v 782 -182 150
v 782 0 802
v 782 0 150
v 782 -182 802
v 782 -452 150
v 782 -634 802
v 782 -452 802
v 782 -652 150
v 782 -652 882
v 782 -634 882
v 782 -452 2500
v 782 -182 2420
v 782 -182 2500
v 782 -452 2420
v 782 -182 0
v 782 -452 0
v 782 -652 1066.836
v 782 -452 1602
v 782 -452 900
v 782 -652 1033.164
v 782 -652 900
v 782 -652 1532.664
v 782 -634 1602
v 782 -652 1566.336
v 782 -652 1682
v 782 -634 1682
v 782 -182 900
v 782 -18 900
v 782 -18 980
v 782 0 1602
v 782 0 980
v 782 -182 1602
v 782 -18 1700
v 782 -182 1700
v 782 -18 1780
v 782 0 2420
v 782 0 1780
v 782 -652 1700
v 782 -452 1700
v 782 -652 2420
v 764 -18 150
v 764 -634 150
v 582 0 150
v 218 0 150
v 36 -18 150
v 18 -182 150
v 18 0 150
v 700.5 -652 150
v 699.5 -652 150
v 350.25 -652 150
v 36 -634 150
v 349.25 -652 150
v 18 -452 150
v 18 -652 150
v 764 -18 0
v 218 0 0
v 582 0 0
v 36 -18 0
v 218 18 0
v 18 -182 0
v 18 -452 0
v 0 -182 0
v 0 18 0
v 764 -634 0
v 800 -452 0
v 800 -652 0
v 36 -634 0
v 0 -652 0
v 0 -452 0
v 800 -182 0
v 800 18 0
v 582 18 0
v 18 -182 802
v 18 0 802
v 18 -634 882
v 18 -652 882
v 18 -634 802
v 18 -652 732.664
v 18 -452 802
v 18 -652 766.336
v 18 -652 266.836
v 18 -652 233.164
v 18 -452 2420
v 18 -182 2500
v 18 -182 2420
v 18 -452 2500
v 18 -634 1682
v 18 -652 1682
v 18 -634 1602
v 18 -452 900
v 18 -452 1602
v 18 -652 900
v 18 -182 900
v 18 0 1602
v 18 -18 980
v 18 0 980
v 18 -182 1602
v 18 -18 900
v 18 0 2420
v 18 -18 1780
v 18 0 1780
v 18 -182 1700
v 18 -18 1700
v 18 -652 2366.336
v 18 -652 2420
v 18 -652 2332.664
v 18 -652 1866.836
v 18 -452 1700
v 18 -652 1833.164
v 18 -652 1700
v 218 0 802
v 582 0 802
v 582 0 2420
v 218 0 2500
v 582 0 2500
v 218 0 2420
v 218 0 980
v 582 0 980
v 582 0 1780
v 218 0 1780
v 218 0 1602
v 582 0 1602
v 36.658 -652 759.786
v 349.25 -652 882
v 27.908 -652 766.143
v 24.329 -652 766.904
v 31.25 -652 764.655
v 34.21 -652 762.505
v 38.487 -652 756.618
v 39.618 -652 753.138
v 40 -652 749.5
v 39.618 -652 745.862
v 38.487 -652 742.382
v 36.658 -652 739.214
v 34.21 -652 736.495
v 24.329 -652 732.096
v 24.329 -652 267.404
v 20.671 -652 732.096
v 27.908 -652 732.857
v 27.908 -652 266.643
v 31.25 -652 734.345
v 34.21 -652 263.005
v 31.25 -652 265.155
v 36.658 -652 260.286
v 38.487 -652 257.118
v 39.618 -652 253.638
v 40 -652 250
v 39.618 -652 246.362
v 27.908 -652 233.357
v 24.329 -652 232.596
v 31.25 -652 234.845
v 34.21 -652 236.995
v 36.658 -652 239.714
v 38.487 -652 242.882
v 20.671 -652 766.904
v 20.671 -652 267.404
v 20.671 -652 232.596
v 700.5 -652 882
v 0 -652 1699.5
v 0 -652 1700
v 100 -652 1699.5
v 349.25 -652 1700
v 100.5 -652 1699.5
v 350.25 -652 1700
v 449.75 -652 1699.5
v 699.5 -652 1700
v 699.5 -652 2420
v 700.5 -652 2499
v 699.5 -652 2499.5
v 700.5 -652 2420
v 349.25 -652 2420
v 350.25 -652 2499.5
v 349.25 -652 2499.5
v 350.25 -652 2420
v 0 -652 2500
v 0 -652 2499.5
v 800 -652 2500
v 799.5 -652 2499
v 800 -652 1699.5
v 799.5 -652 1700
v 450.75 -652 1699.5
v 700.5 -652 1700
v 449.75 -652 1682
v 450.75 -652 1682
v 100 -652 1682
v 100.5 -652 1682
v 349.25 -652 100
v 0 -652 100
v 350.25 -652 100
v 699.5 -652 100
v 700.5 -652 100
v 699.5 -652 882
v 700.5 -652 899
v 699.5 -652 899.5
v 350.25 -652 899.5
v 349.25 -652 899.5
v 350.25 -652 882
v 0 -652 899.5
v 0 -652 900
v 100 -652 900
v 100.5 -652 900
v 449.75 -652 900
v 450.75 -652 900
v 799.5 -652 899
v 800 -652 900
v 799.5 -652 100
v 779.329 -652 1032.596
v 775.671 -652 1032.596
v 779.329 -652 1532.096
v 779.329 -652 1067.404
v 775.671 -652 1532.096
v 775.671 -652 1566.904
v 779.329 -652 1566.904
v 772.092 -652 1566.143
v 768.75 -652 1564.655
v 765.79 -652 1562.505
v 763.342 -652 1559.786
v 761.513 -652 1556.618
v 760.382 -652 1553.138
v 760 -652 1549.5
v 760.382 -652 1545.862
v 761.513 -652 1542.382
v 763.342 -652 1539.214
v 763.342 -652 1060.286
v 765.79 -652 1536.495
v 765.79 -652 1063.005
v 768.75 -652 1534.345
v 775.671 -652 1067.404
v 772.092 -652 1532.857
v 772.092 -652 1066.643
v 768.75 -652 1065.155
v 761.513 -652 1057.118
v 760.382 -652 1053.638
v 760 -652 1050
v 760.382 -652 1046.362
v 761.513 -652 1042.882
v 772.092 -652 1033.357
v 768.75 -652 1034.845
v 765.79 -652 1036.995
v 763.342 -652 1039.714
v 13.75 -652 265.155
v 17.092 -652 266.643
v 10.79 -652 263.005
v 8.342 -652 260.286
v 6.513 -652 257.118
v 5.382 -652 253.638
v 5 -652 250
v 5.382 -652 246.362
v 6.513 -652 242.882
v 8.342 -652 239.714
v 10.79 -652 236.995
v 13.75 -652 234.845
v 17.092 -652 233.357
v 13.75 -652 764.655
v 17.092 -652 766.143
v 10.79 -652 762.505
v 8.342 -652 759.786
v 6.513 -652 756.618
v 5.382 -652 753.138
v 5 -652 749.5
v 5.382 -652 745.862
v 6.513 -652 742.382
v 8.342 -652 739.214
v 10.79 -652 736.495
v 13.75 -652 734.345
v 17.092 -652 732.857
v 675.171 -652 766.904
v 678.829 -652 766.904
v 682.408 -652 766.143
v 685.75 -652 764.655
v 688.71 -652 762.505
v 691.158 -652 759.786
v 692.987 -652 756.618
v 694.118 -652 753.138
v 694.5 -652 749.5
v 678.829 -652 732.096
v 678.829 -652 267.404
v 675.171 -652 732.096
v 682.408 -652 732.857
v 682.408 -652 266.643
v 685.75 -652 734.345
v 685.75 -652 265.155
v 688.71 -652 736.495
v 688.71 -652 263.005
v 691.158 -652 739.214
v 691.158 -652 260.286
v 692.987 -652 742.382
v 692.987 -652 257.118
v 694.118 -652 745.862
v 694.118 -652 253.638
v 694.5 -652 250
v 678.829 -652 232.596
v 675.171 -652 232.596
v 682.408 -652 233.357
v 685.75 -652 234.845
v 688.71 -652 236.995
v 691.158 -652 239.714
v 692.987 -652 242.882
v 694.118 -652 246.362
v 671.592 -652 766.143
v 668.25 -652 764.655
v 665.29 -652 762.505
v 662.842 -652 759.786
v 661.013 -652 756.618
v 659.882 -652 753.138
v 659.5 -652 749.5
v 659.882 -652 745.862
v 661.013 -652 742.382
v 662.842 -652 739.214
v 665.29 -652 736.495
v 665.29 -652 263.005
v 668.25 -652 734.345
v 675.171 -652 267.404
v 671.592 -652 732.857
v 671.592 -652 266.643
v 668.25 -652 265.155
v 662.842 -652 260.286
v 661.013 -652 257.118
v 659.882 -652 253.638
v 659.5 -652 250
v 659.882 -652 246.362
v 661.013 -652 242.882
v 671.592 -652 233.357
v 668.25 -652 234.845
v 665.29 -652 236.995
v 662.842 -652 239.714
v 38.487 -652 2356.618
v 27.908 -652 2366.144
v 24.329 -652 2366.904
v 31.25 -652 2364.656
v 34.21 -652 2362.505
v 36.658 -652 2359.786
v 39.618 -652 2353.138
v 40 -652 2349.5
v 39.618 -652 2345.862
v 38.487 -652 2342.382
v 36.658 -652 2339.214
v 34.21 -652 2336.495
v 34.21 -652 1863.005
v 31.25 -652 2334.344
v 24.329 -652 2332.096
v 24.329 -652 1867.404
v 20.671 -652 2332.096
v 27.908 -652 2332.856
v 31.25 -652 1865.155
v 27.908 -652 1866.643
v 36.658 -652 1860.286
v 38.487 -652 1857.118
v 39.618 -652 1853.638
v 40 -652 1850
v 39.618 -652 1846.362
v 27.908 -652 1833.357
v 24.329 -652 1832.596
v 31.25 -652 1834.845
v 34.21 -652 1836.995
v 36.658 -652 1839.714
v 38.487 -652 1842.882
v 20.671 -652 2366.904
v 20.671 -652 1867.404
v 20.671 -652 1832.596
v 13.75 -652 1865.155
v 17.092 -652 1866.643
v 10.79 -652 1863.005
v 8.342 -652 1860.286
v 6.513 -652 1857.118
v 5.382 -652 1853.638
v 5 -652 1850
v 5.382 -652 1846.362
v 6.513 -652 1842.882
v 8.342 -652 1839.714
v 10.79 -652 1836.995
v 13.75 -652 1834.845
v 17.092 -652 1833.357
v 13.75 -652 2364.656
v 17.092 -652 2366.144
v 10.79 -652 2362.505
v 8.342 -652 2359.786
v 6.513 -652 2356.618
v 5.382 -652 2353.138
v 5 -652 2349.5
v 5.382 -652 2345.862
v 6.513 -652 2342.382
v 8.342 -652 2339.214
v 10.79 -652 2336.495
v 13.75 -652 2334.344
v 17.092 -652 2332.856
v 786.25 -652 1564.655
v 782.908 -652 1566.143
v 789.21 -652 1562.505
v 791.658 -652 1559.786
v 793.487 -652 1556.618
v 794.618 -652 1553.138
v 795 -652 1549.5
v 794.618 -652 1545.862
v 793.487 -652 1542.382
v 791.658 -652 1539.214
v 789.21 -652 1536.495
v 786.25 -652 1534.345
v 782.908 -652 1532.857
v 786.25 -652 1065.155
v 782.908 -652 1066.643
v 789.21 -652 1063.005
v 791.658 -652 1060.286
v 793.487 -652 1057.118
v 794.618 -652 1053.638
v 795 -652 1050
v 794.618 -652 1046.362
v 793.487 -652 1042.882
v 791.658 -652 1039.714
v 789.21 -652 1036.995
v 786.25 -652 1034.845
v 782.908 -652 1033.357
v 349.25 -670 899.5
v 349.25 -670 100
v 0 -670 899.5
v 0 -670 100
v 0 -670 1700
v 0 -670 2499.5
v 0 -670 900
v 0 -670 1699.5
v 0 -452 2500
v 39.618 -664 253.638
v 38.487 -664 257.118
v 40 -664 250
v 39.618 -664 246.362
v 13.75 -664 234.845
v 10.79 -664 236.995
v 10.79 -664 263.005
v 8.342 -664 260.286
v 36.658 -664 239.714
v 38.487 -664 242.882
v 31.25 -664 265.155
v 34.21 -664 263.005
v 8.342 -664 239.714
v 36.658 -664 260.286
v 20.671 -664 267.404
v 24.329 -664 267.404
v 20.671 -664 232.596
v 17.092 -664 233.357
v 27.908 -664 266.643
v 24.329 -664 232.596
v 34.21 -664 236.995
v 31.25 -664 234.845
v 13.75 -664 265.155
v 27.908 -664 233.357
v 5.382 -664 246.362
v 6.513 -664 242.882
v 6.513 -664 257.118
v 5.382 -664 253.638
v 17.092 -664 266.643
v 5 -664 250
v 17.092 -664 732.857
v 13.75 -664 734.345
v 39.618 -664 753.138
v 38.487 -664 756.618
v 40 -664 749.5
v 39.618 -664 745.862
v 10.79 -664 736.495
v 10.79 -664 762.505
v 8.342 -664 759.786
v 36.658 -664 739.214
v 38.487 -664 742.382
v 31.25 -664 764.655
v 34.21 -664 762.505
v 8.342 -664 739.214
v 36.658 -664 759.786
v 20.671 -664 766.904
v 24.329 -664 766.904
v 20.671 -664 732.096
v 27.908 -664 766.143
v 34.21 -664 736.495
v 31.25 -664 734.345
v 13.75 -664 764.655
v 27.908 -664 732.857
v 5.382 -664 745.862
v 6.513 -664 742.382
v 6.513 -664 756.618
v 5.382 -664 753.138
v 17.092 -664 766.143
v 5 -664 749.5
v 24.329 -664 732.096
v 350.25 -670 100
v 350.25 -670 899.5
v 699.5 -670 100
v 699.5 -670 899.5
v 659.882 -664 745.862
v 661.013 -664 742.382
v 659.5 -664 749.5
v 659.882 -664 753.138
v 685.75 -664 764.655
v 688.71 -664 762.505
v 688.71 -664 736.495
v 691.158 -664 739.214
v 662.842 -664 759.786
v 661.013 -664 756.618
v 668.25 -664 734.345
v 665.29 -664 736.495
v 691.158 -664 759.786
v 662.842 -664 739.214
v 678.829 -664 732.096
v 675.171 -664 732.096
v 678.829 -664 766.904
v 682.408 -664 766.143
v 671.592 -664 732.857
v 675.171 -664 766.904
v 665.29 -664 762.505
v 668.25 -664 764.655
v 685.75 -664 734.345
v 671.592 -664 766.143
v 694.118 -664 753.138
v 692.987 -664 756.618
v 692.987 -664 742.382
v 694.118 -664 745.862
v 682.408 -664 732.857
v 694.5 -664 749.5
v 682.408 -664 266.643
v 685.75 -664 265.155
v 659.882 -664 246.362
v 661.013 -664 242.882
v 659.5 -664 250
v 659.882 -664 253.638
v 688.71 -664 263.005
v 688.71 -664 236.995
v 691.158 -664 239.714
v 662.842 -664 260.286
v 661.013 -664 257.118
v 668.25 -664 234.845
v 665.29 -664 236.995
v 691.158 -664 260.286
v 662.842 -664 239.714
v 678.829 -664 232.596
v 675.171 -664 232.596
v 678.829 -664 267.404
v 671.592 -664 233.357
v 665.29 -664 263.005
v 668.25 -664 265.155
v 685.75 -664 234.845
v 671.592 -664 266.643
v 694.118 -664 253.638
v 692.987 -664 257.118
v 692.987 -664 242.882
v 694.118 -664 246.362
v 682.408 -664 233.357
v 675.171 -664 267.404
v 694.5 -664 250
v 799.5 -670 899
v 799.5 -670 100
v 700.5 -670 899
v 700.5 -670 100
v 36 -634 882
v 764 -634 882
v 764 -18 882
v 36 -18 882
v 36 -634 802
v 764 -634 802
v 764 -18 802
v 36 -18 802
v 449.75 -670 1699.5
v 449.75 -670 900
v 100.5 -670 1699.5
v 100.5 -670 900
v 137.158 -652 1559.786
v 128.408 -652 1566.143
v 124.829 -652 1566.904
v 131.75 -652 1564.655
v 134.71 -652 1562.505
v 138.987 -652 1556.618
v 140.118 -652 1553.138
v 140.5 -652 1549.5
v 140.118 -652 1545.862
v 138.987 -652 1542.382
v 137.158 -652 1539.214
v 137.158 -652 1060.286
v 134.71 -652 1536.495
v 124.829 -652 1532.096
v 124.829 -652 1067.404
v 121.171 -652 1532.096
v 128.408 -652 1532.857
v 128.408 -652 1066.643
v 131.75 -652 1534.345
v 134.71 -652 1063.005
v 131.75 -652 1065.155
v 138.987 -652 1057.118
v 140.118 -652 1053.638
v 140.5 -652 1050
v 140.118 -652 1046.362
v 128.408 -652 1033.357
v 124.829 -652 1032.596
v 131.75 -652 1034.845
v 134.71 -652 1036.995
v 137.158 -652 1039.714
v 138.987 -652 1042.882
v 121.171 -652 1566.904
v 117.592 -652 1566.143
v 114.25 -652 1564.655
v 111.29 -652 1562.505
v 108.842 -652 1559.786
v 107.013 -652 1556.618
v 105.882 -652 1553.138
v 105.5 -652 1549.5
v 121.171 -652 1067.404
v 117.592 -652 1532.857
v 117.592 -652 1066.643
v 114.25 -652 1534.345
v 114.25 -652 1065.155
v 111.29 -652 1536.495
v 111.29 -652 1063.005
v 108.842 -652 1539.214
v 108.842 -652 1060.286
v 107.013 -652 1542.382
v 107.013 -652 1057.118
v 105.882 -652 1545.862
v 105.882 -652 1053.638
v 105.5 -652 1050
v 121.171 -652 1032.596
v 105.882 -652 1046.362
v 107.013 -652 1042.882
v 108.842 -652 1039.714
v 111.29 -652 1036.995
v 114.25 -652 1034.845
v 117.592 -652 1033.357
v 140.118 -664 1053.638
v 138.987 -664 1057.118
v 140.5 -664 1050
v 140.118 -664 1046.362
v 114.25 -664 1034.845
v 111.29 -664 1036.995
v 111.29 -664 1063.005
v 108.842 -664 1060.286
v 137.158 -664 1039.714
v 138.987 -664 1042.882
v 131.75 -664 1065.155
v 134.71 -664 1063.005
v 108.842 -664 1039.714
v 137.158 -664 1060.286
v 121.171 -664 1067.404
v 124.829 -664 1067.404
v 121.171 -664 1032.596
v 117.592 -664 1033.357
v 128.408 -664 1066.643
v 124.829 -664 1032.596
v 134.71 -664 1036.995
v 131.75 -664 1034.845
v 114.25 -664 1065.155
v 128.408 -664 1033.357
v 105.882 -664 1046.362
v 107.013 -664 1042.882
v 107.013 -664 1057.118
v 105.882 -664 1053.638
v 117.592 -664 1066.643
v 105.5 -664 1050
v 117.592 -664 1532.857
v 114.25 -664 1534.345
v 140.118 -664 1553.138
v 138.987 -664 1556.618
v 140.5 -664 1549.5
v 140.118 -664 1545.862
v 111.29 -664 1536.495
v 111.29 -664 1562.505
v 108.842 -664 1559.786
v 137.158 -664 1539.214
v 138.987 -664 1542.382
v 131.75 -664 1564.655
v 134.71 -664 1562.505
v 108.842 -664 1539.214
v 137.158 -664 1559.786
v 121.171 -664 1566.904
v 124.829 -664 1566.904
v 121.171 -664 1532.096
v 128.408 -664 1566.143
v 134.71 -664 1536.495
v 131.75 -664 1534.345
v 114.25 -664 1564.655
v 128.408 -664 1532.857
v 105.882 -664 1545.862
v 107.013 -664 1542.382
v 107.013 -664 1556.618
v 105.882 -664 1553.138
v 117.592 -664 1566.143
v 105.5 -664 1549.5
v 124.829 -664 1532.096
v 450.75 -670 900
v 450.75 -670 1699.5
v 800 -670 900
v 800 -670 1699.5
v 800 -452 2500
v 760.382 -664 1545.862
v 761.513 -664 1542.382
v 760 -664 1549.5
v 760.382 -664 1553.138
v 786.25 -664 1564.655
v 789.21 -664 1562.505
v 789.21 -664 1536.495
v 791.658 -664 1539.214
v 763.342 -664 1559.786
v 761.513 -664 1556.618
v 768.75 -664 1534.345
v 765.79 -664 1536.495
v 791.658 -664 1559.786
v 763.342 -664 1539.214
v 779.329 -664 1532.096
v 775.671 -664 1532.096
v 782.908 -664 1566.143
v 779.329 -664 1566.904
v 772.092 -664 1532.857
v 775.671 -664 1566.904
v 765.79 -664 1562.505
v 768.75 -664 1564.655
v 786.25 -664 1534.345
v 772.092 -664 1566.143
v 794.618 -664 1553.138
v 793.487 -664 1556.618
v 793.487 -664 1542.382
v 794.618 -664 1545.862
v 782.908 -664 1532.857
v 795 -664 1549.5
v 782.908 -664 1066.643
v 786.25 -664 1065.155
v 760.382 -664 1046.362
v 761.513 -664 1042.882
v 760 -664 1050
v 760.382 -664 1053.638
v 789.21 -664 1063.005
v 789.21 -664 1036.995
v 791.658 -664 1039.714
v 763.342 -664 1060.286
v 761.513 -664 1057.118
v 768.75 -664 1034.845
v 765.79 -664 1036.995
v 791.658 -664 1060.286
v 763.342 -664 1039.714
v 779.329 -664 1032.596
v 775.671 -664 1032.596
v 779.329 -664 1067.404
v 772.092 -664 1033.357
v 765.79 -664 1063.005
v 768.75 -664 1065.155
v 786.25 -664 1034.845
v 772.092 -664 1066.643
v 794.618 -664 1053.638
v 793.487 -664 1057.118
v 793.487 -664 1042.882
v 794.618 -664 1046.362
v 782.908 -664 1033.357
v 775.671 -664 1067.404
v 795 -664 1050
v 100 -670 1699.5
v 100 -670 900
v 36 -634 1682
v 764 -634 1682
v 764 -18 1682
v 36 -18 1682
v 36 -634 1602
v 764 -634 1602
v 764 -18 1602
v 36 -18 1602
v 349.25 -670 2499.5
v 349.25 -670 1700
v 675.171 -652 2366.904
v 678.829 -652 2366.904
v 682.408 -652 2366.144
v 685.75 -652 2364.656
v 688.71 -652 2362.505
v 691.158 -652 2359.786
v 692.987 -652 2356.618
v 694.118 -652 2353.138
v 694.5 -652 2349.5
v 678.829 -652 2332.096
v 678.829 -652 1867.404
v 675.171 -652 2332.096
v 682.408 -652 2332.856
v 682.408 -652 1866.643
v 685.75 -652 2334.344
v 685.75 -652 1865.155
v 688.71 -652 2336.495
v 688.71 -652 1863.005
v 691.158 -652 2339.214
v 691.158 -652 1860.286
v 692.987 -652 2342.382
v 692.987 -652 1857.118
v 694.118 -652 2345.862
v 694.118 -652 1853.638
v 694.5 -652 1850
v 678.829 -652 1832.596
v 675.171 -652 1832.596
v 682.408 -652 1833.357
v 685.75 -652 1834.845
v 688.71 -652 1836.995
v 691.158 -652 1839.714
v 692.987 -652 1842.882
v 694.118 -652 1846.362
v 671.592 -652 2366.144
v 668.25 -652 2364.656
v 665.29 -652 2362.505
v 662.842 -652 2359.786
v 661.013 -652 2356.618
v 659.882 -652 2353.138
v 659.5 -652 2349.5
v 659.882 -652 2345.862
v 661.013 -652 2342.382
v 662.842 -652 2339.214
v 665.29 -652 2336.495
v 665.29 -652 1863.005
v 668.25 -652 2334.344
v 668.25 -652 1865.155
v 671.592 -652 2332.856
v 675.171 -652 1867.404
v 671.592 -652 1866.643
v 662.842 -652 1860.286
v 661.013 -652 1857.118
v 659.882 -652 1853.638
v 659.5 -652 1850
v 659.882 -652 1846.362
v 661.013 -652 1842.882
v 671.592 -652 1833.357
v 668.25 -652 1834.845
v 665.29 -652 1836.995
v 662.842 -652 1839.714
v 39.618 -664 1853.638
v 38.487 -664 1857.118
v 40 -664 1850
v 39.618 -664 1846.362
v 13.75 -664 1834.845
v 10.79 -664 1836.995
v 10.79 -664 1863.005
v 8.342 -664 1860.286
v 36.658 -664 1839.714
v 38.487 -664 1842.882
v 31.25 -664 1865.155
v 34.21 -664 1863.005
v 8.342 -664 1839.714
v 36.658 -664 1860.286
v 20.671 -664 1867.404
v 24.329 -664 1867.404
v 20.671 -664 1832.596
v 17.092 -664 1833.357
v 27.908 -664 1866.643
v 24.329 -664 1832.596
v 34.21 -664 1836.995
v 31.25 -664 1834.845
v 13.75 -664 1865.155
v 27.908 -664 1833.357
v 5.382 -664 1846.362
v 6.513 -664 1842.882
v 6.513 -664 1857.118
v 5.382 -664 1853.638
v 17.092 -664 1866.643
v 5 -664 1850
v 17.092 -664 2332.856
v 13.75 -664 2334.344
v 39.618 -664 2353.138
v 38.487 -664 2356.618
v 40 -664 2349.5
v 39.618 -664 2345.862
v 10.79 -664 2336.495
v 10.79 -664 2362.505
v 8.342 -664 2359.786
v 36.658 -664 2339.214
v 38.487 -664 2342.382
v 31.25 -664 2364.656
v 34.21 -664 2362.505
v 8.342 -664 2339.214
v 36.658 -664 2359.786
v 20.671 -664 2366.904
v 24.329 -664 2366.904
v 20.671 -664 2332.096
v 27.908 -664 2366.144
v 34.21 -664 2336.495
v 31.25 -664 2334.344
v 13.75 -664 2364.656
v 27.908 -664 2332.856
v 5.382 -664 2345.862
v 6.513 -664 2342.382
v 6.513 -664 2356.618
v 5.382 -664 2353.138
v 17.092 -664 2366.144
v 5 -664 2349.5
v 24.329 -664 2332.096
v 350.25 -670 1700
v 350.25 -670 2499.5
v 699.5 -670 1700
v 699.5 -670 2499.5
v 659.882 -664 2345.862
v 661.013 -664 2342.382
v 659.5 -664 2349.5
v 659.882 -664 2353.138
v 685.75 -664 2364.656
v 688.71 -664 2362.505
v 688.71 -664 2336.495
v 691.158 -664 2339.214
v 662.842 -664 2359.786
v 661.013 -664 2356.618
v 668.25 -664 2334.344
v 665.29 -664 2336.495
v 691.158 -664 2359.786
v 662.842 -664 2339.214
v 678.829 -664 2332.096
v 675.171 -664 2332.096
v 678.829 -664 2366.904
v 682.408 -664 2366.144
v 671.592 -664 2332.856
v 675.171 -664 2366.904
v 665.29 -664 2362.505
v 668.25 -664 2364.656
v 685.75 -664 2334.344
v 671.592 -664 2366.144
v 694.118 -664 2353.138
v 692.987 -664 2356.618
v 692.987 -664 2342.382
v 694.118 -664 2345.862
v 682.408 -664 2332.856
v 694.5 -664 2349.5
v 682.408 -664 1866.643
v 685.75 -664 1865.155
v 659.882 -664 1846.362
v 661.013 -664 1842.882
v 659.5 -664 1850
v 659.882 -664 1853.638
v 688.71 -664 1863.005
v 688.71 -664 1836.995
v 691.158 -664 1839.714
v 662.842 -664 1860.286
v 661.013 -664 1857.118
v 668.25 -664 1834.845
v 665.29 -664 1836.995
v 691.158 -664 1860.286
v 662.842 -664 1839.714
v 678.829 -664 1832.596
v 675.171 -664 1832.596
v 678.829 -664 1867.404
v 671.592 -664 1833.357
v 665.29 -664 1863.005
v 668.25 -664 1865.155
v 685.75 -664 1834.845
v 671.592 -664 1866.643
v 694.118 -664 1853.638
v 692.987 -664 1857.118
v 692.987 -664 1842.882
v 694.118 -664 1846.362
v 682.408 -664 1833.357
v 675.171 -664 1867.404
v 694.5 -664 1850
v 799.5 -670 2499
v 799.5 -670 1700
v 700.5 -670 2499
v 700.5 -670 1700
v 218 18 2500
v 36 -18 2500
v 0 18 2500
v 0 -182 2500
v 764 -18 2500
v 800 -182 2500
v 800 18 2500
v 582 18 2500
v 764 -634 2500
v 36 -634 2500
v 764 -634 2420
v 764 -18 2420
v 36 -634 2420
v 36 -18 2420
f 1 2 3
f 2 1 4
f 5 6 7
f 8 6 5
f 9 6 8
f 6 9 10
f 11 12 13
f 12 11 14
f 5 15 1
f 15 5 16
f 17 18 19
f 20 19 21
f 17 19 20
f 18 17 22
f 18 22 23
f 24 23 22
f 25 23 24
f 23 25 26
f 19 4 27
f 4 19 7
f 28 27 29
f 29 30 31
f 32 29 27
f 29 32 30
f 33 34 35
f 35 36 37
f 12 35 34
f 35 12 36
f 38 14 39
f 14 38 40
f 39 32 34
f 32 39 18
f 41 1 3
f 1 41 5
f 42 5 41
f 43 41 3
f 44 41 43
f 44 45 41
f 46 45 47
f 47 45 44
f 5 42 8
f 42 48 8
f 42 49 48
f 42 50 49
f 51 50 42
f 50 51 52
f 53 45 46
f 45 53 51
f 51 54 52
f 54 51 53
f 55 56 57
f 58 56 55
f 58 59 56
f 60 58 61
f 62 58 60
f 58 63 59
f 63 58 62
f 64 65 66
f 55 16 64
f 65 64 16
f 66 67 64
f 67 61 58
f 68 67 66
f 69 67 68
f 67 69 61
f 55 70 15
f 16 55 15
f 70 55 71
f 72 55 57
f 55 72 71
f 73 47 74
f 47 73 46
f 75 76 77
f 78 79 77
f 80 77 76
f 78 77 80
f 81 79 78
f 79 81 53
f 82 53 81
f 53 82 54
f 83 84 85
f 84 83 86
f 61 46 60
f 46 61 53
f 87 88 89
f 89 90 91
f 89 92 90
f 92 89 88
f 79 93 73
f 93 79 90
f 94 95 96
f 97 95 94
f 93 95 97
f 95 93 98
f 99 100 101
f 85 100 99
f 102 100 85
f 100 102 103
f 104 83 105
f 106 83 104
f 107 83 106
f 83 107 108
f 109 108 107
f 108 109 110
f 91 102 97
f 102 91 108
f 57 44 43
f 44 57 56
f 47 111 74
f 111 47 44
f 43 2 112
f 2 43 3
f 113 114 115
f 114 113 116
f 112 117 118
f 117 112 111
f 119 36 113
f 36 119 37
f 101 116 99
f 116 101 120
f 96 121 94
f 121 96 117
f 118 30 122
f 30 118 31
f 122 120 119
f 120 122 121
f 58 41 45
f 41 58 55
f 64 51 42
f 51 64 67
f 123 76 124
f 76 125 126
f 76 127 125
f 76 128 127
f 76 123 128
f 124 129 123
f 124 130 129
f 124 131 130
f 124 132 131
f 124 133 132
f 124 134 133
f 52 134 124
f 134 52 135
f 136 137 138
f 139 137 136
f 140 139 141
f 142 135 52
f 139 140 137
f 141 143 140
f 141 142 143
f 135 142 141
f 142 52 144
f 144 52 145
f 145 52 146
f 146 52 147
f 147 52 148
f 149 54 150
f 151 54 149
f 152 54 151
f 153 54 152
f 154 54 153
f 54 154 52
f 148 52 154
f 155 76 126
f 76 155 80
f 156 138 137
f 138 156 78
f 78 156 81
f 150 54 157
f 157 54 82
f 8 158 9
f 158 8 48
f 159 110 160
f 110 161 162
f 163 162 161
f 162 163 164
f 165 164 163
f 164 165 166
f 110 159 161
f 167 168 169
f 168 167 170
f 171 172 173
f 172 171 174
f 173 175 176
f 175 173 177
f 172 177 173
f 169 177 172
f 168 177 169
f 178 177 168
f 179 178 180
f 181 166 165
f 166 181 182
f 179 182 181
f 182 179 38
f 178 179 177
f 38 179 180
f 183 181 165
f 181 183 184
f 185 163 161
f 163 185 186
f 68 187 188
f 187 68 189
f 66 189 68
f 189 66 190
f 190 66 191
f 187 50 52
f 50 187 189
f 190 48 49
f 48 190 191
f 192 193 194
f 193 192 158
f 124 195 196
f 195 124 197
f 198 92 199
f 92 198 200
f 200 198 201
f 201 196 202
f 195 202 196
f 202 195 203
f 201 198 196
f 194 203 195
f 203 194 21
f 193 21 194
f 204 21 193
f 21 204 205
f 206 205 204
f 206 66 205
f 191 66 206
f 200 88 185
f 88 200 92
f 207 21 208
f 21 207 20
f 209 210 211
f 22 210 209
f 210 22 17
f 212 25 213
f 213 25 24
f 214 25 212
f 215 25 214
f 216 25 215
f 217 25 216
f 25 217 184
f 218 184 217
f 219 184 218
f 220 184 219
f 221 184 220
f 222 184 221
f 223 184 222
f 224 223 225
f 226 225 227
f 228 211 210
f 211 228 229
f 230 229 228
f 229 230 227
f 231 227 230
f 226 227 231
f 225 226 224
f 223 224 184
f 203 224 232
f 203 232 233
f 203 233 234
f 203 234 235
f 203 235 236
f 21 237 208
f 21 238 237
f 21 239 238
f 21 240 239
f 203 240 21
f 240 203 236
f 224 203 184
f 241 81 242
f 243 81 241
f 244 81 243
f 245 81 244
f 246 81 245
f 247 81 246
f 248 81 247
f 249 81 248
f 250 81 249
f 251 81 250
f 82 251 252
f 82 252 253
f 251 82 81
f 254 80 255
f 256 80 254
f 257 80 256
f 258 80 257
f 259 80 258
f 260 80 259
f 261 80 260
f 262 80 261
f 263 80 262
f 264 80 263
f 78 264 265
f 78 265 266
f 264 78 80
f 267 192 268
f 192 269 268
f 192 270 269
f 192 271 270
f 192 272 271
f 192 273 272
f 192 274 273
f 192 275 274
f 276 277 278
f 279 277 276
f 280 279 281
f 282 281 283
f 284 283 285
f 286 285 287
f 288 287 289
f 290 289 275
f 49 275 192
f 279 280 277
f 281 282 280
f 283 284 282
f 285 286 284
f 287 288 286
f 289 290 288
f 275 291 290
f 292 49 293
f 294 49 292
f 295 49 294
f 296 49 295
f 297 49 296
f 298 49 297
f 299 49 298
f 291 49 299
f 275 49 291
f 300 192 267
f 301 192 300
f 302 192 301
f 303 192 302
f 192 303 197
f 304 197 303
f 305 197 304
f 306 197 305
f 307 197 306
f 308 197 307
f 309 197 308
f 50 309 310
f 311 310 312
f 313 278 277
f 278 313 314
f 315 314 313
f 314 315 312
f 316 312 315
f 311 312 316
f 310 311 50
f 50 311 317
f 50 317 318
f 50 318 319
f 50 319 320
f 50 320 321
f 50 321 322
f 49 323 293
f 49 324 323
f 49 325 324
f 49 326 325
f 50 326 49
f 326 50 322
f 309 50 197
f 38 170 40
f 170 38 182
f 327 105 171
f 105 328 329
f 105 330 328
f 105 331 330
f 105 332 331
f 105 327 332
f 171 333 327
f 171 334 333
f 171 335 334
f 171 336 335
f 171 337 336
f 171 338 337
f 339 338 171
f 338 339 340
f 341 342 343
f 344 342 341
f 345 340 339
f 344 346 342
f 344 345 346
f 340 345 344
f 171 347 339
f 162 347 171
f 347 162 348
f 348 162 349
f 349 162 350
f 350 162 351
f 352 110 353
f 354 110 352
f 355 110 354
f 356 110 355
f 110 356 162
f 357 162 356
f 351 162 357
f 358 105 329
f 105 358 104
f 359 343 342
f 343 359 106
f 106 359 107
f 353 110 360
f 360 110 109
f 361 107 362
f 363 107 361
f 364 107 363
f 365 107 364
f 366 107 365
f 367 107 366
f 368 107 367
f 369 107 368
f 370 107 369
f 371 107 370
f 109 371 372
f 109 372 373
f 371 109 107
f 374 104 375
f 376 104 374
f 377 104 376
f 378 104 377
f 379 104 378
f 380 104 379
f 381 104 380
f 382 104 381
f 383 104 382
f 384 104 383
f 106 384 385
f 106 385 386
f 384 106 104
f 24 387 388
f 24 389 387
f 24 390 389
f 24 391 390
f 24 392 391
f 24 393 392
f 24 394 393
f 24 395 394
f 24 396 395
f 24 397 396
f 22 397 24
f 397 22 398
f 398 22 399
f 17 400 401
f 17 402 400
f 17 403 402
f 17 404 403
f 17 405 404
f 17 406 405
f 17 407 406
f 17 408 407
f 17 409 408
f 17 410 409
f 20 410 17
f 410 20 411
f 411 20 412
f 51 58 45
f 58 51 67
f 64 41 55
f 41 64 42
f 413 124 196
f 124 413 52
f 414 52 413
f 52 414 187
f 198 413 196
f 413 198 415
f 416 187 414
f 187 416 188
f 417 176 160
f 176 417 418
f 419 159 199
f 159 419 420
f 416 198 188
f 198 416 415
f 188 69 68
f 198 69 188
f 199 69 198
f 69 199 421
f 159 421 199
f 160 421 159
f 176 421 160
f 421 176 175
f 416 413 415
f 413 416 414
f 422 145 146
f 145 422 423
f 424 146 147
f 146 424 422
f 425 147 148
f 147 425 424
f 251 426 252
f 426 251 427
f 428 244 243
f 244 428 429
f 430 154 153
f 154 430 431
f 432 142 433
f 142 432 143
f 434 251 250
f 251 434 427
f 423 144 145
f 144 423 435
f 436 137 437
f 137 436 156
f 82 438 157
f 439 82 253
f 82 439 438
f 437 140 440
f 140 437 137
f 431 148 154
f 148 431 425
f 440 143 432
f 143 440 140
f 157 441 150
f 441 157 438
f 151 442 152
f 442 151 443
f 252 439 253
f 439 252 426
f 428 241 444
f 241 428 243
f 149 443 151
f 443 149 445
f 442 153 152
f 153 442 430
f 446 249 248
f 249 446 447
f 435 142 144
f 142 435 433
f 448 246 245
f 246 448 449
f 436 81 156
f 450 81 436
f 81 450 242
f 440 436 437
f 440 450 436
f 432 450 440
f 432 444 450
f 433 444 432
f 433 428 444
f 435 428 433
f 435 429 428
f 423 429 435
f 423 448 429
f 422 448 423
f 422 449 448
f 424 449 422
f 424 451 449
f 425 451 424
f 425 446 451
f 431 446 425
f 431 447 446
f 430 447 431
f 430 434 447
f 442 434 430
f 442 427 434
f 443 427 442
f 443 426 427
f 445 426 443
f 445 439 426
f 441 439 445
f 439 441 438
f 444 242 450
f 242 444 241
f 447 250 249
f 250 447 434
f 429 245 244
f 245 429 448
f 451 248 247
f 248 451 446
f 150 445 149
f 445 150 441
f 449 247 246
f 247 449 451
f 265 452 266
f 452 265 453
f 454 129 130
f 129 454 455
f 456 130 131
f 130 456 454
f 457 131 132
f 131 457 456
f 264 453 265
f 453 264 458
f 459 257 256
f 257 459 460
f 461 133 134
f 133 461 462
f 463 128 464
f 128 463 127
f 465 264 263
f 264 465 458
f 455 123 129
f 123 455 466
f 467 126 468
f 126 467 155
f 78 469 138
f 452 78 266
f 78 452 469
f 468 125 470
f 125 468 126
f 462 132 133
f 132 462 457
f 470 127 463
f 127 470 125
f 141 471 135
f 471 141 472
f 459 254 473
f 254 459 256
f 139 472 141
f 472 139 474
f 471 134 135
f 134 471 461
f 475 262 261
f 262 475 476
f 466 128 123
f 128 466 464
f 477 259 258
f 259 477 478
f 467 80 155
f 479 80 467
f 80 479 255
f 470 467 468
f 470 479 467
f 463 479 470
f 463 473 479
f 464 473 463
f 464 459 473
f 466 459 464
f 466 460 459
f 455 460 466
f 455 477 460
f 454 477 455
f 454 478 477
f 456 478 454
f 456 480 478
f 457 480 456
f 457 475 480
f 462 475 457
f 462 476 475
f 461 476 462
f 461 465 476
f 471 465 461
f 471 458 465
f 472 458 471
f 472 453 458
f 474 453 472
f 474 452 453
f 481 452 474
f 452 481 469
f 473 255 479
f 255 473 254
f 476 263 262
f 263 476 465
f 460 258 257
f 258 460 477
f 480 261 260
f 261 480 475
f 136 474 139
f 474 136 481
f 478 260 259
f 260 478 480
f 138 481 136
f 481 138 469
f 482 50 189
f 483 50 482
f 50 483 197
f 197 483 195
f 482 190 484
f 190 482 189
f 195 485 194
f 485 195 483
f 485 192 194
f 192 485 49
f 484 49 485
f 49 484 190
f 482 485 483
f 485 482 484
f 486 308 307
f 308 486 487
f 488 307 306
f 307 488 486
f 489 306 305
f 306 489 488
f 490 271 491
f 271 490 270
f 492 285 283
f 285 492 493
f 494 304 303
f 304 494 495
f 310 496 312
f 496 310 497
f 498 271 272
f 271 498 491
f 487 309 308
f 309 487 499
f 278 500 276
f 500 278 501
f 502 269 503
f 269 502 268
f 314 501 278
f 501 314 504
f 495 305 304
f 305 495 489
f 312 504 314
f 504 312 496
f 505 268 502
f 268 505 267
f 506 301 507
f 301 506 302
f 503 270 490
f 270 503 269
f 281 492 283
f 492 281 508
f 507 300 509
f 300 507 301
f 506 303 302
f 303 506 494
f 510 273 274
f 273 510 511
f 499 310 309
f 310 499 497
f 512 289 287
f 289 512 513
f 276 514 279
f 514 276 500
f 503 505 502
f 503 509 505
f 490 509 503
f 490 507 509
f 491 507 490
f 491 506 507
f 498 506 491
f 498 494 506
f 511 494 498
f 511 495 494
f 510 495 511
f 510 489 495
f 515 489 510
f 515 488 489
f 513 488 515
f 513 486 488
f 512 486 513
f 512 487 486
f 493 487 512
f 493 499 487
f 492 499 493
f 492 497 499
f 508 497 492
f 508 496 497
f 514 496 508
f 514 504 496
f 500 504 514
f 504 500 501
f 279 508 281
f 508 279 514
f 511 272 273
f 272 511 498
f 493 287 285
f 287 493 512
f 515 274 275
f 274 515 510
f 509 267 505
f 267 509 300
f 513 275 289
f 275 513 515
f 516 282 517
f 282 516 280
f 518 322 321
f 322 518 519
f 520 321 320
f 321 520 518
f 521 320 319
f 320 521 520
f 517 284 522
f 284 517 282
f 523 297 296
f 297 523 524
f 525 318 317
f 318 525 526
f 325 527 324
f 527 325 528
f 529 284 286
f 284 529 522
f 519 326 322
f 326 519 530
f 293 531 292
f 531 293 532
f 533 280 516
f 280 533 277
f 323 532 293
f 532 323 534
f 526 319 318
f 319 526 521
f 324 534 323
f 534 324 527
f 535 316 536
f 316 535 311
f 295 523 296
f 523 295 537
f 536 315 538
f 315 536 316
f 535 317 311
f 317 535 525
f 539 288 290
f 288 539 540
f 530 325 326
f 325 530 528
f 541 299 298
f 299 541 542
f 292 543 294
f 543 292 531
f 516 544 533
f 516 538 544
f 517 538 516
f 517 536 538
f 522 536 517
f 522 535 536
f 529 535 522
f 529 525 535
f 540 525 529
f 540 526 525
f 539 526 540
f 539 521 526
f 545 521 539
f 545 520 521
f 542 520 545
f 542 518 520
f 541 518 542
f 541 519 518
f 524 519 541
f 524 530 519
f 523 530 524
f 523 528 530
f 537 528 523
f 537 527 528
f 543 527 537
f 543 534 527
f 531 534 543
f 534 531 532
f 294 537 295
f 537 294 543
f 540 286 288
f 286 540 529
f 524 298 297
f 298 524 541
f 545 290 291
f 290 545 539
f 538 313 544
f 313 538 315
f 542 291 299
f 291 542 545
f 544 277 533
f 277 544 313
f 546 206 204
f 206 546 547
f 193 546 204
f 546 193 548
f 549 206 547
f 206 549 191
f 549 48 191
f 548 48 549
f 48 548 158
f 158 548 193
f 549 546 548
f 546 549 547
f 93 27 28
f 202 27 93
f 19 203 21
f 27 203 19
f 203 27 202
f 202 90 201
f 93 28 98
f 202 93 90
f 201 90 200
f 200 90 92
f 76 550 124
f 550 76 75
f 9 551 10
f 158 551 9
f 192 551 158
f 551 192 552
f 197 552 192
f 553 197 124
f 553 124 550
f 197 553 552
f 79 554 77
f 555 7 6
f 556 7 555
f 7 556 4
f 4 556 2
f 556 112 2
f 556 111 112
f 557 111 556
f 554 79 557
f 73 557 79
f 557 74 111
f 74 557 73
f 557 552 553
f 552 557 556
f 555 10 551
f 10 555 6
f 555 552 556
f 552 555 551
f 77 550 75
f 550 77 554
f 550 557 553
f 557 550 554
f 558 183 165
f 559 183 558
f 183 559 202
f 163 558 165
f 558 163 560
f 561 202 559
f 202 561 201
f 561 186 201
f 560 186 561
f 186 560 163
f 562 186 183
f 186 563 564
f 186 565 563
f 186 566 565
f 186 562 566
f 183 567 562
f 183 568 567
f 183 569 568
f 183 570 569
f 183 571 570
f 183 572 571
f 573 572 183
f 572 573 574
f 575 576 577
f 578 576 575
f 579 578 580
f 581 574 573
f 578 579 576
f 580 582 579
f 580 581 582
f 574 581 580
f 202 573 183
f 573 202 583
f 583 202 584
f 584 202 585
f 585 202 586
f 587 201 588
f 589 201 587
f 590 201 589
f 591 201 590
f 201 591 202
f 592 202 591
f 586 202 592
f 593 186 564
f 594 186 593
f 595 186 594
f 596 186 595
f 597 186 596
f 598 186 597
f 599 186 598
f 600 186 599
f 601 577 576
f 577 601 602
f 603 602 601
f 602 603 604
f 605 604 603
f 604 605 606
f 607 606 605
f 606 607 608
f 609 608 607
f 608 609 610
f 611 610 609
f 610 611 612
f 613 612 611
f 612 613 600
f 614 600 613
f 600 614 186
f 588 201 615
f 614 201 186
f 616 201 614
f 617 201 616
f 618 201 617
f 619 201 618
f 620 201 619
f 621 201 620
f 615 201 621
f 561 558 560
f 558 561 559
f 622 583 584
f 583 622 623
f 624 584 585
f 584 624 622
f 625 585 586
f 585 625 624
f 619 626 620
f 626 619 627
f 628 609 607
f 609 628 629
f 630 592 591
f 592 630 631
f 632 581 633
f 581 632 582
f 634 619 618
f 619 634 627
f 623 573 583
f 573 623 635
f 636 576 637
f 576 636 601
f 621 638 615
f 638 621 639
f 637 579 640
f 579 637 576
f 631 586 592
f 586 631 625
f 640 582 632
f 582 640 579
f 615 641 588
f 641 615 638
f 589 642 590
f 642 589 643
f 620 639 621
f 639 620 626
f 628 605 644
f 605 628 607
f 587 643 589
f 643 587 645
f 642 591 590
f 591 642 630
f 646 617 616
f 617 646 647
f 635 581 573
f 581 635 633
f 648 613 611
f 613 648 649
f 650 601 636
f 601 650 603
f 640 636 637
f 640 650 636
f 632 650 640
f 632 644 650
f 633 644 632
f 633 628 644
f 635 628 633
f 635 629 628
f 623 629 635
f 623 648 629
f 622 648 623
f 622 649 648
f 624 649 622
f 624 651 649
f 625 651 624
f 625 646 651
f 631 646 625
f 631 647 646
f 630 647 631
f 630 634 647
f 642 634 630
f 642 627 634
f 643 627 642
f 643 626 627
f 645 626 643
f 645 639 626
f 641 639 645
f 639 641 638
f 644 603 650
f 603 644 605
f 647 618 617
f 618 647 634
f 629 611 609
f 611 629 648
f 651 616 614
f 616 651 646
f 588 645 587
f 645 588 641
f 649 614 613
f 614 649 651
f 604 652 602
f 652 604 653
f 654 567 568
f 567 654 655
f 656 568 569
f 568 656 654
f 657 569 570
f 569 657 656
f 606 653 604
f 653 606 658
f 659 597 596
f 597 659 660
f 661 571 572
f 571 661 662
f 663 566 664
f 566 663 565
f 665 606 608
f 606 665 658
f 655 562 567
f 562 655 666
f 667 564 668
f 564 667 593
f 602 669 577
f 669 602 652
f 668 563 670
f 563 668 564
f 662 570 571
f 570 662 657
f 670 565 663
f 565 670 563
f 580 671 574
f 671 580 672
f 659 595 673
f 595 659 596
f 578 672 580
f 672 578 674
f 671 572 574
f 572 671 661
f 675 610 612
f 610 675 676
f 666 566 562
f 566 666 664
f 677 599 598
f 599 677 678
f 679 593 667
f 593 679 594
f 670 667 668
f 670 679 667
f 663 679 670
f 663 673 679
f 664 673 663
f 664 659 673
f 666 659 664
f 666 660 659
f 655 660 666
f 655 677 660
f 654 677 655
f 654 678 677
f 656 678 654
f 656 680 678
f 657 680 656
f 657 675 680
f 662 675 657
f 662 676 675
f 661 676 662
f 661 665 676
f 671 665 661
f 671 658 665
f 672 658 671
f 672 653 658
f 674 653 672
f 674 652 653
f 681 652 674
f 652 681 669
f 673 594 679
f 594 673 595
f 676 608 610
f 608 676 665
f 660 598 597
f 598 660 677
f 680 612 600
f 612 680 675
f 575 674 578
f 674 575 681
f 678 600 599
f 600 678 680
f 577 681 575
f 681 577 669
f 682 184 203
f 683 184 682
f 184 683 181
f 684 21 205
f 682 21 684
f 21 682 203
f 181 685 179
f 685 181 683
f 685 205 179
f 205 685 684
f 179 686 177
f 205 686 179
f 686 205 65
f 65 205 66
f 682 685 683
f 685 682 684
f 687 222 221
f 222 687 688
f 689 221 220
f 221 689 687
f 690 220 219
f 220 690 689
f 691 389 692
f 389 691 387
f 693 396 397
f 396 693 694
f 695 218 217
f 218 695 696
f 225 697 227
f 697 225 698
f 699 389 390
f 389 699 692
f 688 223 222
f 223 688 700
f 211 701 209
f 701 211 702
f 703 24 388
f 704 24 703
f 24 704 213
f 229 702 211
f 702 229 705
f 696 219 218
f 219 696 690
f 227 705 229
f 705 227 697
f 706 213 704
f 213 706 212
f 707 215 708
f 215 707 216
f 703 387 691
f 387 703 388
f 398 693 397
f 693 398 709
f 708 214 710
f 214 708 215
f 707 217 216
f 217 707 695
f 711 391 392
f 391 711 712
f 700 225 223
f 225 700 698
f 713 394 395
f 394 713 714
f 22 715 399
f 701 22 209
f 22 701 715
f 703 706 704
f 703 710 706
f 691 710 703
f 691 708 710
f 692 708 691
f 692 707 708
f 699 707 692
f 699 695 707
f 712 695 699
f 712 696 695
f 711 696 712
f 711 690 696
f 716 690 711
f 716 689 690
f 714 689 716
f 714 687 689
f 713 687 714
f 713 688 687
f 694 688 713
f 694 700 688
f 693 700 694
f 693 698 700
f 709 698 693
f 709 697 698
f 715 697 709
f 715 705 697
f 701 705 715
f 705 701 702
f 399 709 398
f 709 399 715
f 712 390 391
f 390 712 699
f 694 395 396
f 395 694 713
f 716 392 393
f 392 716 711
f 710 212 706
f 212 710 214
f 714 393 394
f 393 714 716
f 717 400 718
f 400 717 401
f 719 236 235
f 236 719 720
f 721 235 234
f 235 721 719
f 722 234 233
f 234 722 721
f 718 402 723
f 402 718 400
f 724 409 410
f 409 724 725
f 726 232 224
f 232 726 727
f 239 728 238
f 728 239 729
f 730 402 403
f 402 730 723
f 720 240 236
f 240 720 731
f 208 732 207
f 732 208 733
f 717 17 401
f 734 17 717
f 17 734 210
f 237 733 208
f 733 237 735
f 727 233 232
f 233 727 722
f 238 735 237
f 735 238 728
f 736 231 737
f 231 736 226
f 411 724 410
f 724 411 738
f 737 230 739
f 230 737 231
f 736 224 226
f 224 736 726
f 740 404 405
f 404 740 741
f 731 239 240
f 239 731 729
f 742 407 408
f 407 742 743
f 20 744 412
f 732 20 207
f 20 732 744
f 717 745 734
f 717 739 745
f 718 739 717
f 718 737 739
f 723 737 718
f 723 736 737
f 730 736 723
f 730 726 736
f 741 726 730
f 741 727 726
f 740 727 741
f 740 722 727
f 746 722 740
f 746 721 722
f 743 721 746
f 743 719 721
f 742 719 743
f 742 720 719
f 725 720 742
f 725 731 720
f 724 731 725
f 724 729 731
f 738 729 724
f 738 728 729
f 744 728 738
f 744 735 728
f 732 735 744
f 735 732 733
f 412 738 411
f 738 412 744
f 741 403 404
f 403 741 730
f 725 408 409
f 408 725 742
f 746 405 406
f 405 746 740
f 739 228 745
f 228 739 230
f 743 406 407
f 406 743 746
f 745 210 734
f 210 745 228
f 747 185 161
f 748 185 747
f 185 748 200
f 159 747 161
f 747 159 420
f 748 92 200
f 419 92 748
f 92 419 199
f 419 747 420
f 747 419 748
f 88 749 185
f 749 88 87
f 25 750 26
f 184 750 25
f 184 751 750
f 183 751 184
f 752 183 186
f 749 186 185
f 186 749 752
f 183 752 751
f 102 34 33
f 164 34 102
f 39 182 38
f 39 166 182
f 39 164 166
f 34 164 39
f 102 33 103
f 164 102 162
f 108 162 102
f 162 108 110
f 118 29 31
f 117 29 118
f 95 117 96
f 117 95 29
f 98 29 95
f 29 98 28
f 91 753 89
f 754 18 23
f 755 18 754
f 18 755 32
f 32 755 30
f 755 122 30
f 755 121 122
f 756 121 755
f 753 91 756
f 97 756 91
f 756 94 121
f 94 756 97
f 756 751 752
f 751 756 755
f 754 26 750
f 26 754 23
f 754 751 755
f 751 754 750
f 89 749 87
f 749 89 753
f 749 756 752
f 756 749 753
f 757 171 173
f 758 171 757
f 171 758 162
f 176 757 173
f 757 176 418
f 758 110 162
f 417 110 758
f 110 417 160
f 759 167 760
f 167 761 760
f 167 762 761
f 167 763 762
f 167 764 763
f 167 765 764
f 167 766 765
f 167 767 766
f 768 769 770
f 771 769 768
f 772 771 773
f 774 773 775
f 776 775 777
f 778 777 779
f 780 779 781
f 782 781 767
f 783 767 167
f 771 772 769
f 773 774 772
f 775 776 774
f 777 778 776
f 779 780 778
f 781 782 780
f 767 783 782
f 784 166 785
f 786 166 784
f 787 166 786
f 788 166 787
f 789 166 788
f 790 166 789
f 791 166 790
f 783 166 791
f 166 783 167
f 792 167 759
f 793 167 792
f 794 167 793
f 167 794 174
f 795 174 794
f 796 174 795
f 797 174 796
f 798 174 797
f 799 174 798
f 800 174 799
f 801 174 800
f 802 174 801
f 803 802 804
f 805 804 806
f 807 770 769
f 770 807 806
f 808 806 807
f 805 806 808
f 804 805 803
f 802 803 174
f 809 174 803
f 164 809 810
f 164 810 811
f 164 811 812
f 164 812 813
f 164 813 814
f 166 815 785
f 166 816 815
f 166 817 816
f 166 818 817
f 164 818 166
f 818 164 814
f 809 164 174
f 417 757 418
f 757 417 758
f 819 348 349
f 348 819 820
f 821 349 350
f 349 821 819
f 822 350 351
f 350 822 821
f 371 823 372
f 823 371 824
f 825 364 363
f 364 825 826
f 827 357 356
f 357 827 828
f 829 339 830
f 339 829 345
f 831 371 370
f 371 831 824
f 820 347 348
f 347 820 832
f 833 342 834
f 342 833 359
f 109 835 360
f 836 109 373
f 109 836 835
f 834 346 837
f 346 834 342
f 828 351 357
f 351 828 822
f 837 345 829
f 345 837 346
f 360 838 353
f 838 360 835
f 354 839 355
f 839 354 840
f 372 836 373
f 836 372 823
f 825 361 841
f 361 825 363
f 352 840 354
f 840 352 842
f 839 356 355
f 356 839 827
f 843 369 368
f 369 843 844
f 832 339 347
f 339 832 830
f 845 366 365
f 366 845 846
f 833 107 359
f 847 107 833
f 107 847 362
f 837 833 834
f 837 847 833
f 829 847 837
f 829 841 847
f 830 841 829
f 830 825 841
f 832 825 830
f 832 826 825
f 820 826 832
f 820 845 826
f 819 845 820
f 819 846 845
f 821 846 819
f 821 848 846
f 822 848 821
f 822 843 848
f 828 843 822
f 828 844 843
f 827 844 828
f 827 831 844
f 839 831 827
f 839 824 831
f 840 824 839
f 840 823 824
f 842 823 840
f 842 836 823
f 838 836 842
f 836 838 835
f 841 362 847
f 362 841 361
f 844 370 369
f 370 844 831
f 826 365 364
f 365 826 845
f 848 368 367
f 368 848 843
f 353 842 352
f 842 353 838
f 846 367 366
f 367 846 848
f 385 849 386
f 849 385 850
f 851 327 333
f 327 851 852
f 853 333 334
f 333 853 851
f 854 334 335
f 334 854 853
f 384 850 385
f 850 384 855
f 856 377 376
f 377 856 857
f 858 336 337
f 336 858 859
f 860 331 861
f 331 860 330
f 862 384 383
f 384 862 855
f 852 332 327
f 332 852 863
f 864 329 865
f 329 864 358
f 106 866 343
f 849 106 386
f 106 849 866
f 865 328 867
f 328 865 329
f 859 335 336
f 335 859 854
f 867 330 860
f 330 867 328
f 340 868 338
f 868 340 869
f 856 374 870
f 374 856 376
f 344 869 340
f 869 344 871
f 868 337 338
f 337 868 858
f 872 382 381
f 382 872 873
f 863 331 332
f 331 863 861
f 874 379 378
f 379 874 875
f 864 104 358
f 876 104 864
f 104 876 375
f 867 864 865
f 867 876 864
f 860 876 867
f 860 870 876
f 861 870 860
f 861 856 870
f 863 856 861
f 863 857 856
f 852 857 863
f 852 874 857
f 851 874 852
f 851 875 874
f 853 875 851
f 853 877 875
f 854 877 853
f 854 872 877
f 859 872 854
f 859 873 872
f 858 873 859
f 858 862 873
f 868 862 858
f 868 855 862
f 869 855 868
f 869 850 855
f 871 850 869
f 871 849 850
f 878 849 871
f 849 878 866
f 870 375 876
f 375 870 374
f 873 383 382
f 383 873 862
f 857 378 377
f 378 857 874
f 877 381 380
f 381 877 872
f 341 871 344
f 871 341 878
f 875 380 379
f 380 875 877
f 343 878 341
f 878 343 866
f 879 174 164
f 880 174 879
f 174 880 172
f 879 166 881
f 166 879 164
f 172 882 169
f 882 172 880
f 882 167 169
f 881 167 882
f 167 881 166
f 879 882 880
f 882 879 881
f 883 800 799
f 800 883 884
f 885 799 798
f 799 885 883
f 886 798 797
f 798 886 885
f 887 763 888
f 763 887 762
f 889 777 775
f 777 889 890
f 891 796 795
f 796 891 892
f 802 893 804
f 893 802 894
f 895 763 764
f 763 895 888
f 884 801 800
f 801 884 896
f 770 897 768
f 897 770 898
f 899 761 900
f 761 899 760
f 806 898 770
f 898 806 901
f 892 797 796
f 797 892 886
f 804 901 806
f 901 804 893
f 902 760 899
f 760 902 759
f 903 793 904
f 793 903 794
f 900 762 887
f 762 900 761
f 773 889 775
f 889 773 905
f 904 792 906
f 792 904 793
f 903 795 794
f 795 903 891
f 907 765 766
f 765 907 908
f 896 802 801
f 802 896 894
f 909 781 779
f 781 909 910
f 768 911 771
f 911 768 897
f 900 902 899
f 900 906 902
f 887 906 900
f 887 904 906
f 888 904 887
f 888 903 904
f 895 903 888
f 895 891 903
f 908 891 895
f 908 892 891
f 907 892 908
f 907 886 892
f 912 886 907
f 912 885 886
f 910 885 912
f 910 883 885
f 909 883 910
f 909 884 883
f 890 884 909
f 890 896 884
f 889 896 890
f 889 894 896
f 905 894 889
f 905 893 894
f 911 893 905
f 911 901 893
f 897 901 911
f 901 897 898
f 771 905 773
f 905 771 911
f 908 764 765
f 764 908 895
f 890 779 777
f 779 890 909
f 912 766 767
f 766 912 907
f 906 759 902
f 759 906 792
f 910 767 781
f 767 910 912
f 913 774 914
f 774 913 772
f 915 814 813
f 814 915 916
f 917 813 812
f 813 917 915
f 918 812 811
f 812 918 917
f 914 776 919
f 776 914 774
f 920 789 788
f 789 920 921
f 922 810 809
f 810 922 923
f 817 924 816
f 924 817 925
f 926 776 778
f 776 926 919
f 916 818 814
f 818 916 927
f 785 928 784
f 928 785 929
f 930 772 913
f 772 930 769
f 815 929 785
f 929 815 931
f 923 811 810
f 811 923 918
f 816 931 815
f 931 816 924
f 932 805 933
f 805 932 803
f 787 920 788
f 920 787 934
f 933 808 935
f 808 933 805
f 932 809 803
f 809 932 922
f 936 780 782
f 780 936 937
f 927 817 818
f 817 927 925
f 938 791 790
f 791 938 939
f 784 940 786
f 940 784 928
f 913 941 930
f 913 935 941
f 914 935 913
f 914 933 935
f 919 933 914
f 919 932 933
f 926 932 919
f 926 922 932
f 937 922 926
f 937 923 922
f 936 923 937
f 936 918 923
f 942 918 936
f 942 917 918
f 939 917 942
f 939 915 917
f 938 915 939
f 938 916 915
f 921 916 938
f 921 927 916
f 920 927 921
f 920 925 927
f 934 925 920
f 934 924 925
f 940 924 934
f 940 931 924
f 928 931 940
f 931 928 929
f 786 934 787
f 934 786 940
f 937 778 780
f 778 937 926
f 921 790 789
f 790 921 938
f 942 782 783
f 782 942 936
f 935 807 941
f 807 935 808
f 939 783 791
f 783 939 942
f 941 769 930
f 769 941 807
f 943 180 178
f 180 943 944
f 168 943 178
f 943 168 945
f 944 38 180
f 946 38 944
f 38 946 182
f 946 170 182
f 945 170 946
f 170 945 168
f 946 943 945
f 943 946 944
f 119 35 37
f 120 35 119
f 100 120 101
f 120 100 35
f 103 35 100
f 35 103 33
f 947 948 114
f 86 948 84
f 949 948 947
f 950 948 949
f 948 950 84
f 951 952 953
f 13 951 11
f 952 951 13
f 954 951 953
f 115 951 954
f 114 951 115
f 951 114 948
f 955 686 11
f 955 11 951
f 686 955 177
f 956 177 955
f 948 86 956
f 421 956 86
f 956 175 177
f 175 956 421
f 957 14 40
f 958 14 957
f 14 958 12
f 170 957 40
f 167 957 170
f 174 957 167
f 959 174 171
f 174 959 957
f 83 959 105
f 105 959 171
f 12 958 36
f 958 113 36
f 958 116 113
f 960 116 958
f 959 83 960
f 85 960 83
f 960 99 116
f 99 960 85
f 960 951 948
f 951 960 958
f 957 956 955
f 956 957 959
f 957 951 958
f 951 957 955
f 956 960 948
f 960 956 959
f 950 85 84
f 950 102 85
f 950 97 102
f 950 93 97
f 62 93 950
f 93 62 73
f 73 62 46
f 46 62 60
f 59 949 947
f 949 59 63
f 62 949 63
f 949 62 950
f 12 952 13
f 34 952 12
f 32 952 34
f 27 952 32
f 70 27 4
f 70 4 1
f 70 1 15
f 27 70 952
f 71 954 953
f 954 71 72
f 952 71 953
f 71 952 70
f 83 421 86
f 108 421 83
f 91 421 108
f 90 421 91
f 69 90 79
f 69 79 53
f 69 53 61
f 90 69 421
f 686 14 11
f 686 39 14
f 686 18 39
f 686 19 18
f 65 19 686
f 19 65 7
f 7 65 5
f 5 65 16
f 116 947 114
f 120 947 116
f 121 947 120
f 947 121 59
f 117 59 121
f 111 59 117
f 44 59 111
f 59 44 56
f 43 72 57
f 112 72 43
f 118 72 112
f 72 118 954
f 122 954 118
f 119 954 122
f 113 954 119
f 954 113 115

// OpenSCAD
max_height = 2500;
max_width = 800;
max_length  =670;
pal_width = 18;
default_dist_between=0.5;
washing_machine_part_height=800;
bottom_part_height=100;
door_1_part_height=800;
door_2_part_height=800;
stren_size=80;
elements=[[]];
asym_dist_len = 100;
module board(height, width,name="Undefined"){
    cube([width,pal_width,height]);
    echo(str("Board: ",name,";Size:",height,"x",+width,"x",pal_width));
}  
module vboard(height, width,name="UndefV"){
    board(height, width,name);
}
module hboard(length, width,name="UndefH"){
    rotate ([90,0,0])board(length, width,name);;
}
module stren_fb(width,height=stren_size,type="fata/spate"){
    if (height != stren_size){
        vboard(height,width-pal_width*2,str("Intaritura ",type,height));}
    else{
        vboard(height,width-pal_width*2,str("Intaritura ",type," standard"));
    }
}
module stren_lat(width,height=stren_size){
     rotate([00,0,-90]) stren_fb(width-pal_width,height,type="lateral");
}
module asym_dist(height){
    
    //light switch panel
     vboard(height-1,asym_dist_len-1,"Panel distantier");
}
module door(height,width,name=""){
        difference(){
            vboard(height,width,str("Door ",name)); 
            translate([5+35/2,pal_width+1,150])rotate ([90,0,0]) cylinder(13,35/2,35/2);
            translate([5+35/2,pal_width+1,height-150])rotate ([90,0,0]) cylinder(13,35/2,35/2);
        }
}
module doors(height, width, dist_mid=default_dist_between,dist_ud=default_dist_between){
    panel_w=width/2-dist_mid;
    panel_h=height-dist_ud;
    //door left
    door(panel_h,panel_w,"dreapta");
    //door right
    translate([(width),0,height-default_dist_between]) rotate ([00,180,0])door(panel_h,panel_w,"stanga");
    
}
module washing_machine_part(height, width, length=0){
    //assymetrical distancer
    translate([width-asym_dist_len+default_dist_between,-length] ) asym_dist(height);
    
    

    //doors
    translate([0,-length] ){
        doors(height,width-asym_dist_len-default_dist_between);
    }
    
    //raft
    translate([pal_width,0,height-pal_width] ) hboard(length-pal_width,width-pal_width*2,"raft");
    
    //strengths
    //translate([pal_width,-pal_width,0] ) stren_fb(width); //back down
    //translate([pal_width,-length+pal_width,0] ) stren_fb(width);//front down
    translate([pal_width,-pal_width,height-pal_width-stren_size] ) stren_fb(width);//back up
    //translate([pal_width,-length+pal_width,height-pal_width-stren_size] ) stren_fb(width);//front up
    //translate([pal_width,-pal_width,0] )  stren_lat(width); // down left
    //translate([pal_width+width-pal_width*3,-pal_width,0] ) stren_lat(width); // down right
    translate([pal_width+width-pal_width*3,-pal_width,height-stren_size-pal_width] ) stren_lat(length); //right up
    translate([pal_width,-pal_width,height-stren_size-pal_width] ) stren_lat(length); //left up
    

}
module bottom_part(height, width, length=0){
    
    //strengths
    translate([pal_width,-pal_width,0] ) stren_fb(width,150); //back down
    translate([pal_width,-length+pal_width,0] ) stren_fb(width,150);//front down
    //translate([pal_width,-pal_width,height-pal_width-stren_size] ) stren_fb(width);//back up
    //translate([pal_width,-length+pal_width,height-pal_width-stren_size] ) stren_fb(width);//front up
    translate([pal_width,-pal_width,0] )  stren_lat(length,150); // down left
    translate([pal_width+width-pal_width*3,-pal_width,0] ) stren_lat(length,150); // down right
    //translate([pal_width+width-pal_width*3,-pal_width,height-stren_size-pal_width] ) stren_lat(width); //right up
    //translate([pal_width,-pal_width,height-stren_size-pal_width] ) stren_lat(width); //left up
    

}
module sertare_part(height, width, length=0){
    translate([0,-length,0] )board(height-default_dist_between,width);  
    translate([pal_width,0,height-pal_width] ) hboard(length-pal_width,width-pal_width*2);
     //back up strenght
    translate([pal_width,-pal_width,height-pal_width-100] ) vboard(100,width-pal_width*2,"Intaritura fata/spate");
    
  
   
    }
module door1_part(height, width, length=0){
    light_width = 100;
    //light switch panel
    translate([0,-length,0] ) board(height-default_dist_between,light_width,"panel distanta");
    
    //doors
    translate([light_width+default_dist_between,-length,0] ){
         doors(height,width-asym_dist_len-default_dist_between);
    }
    
    //raft
    translate([pal_width,0,height-pal_width] ) hboard(length-pal_width,width-pal_width*2,"raft");
    
    //strengths
    translate([pal_width,-pal_width,0] ) stren_fb(width); //back down
    //translate([pal_width,-length+pal_width,0] ) stren_fb(width);//front down
    translate([pal_width,-pal_width,height-pal_width-stren_size] ) stren_fb(width);//back up
    //translate([pal_width,-length+pal_width,height-pal_width-stren_size] ) stren_fb(width);//front up
    //translate([pal_width,-pal_width,0] )  stren_lat(width); // down left
    //translate([pal_width+width-pal_width*3,-pal_width,0] ) stren_lat(width); // down right
        translate([pal_width+width-pal_width*3,-pal_width,height-stren_size-pal_width] ) stren_lat(length); //right up
    translate([pal_width,-pal_width,height-stren_size-pal_width] ) stren_lat(length); //left up
}

module door2_part(height, width, length=0){
    //assymetrical distancer
    translate([width-asym_dist_len+default_dist_between,-length,0] ) asym_dist(height);
    
    //doors
    translate([0,-length,0] ){
        doors(height,width-asym_dist_len-default_dist_between);
    }
    
    //strengths
    translate([pal_width,-pal_width,0] ) stren_fb(width); //back down
    //translate([pal_width,-length+pal_width,0] ) stren_fb(width);//front down
    translate([pal_width,-pal_width,height-stren_size] ) stren_fb(width);//back up
    translate([pal_width,-length+pal_width,height-stren_size] ) stren_fb(width);//front up
    //translate([pal_width,-pal_width,0] )  stren_lat(width); // down left
    //translate([pal_width+width-pal_width*3,-pal_width,0] ) stren_lat(width); // down right
    translate([pal_width+width-pal_width*3,-pal_width,height-stren_size] ) stren_lat(length); //right up
    translate([pal_width,-pal_width,height-stren_size] ) stren_lat(length); //left up

    }
module laterals(height,width,length){
    length2=200;
    //Back LEFT LAT
    translate([0,pal_width,0]) rotate ([0,0,-90]) vboard(height,length2,"stalp lateral");
    //Back RIGHT LAT
    translate([width-pal_width,pal_width,0]) rotate ([0,0,-90]) vboard(height,length2,"stalp lateral");
    
    //Front LEFT LAT
    translate([0,-length+length2+pal_width,0]) rotate ([0,0,-90]) vboard(height,length2,"stalp lateral");
    //Front RIGHT LAT
    translate([width-pal_width,-length+length2+pal_width,0]) rotate ([0,0,-90]) vboard(height,length2,"stalp lateral");
    
    //BACK LEFT BACK
    translate([pal_width,0,0]) rotate ([0,0,-0]) vboard(height,length2,"stalp spate");
    //BACK RIGHT BACK
    translate([width-length2-pal_width,0,0]) rotate ([0,0,-0]) vboard(height,length2,"stalp spate");
}
module the_thing(){
    color("white") 
    translate([0,0,0] )bottom_part(bottom_part_height,max_width,max_length);
    
    color("white") 
    translate([0,0,bottom_part_height] )washing_machine_part(washing_machine_part_height,max_width,max_length);
    //translate([0,0,washing_machine_part_height] )color("white") sertare_part(sertare_part_height,max_width,max_length);
    translate([0,0,washing_machine_part_height+bottom_part_height] )color("white") door1_part(door_1_part_height,max_width,max_length);
    translate([0,0,washing_machine_part_height+bottom_part_height+door_1_part_height] )color("white") door2_part(door_2_part_height,max_width,max_length);
    
    #laterals(max_height,max_width,max_length);
}

translate([0,0,0] ) the_thing();
